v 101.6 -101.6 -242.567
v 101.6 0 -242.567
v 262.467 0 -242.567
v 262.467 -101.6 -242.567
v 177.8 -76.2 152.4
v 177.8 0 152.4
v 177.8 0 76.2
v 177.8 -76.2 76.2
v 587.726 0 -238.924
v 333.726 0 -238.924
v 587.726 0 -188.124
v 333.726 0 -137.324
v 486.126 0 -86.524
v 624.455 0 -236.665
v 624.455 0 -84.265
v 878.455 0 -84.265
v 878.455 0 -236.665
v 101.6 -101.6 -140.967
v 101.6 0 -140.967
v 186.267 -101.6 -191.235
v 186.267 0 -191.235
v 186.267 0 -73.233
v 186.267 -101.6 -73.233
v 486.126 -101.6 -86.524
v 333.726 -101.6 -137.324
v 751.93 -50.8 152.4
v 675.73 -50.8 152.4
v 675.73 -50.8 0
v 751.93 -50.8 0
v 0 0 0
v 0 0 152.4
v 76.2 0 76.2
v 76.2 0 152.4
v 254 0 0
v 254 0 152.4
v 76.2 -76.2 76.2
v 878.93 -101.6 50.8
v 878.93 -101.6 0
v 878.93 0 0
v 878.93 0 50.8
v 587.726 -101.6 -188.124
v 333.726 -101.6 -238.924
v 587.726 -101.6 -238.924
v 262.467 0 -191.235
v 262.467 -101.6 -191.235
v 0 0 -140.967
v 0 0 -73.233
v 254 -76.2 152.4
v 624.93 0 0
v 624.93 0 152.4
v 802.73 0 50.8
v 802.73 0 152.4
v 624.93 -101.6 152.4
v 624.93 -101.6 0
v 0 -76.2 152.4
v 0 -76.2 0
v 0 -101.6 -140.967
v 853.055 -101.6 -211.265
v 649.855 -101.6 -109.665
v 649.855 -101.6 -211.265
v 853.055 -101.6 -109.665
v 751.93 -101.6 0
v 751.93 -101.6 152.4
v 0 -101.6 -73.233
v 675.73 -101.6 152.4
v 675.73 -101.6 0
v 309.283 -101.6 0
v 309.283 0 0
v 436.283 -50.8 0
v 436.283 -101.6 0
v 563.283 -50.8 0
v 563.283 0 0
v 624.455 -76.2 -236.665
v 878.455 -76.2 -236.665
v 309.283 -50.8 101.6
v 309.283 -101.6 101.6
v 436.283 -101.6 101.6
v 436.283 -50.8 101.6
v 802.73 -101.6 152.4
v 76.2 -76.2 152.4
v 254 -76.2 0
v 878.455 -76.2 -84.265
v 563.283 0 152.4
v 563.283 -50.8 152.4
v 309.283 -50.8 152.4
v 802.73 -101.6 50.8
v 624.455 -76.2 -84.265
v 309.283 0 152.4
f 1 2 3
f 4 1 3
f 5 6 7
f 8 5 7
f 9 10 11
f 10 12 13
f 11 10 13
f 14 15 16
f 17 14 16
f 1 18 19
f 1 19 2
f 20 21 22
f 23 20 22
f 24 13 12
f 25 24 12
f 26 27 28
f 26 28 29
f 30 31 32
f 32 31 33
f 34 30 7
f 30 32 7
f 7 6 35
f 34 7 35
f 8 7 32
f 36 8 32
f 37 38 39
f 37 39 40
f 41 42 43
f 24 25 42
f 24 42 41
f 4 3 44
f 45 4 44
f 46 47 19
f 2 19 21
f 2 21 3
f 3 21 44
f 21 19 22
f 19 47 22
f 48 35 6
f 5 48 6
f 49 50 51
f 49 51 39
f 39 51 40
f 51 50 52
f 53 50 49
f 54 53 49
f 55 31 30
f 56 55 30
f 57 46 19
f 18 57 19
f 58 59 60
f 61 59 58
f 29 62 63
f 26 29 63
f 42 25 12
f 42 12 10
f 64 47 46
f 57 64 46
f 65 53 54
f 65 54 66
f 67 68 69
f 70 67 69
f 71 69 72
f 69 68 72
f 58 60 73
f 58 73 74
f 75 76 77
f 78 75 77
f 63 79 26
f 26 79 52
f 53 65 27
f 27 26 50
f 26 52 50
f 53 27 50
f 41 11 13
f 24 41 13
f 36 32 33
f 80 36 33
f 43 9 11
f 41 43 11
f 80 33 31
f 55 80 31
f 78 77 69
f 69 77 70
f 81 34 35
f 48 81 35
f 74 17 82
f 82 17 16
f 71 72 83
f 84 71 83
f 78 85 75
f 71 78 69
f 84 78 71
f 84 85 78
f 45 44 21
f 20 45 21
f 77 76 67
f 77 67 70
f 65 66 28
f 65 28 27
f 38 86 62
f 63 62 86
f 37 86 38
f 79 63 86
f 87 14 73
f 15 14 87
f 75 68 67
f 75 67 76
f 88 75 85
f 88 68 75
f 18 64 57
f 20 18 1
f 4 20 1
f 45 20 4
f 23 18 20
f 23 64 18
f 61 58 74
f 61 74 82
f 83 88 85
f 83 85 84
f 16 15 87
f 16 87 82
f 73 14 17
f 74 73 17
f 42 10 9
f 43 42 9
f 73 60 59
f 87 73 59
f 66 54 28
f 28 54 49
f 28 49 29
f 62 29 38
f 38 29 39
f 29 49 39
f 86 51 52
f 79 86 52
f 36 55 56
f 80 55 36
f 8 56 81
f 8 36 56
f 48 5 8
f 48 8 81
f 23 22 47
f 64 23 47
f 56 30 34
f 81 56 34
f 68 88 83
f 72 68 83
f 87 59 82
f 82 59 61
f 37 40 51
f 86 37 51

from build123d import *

# Parameters (mm, degrees)
F1_DEPTH  = 76.2
F2_W      = 254
F2_H      = 152.4
F3_DEPTH  = 101.6
F5_DEPTH  = 50.8
F6_W      = 76.2
F6_H      = 101.6
F7_DEPTH  = 101.6
F8_W      = 76.2
F8_H      = 152.4
F9_DEPTH  = 50.8
F11_DEPTH = 101.6
F13_DEPTH = 101.6
F14_W     = 254
F14_H     = 152.4
F15_DEPTH = 101.6
F16_SIZE  = 25.4


with BuildPart() as f1:
    # F0 (on Front) → F1 (new body)
    with BuildSketch(Plane.XZ):
        Polygon((0, 152.4), (0, 0), (254, 0), (254, 152.4), (177.8, 152.4), (177.8, 76.2), (76.2, 76.2), (76.2, 152.4), align=None)
    extrude(amount=F1_DEPTH)


with BuildPart() as f3:
    # F2 (on Front) → F3 (new body)
    with BuildSketch(Plane.XZ):
        with Locations((436.282601, 76.2)):
            Rectangle(F2_W, F2_H)
    extrude(amount=F3_DEPTH)

    # F4 (on face) → F5 (cut)
    with BuildSketch(Plane.XZ.offset(101.6)):
        Polygon((309.282601, 152.4), (309.282601, 101.6), (436.282601, 101.6), (436.282601, 0), (563.282601, 0), (563.282601, 152.4), align=None)
    extrude(amount=-F5_DEPTH, mode=Mode.SUBTRACT)


with BuildPart() as f7:
    # F6 (on Front) → F7 (new body)
    with BuildSketch(Plane.XZ):
        Polygon((624.930065, 152.4), (624.930065, 0), (878.930065, 0), (878.930065, 50.8), (802.730065, 50.8), (802.730065, 152.4), (751.930065, 152.4), (751.930065, 50.8), (675.730065, 50.8), (675.730065, 152.4), align=None)
        with Locations((713.830065, 101.6)):
            Rectangle(F6_W, F6_H)
    extrude(amount=F7_DEPTH)

    # F8 (on face) → F9 (cut)
    with BuildSketch(Plane.XZ.offset(101.6)):
        with Locations((713.830065, 76.2)):
            Rectangle(F8_W, F8_H)
    extrude(amount=-F9_DEPTH, mode=Mode.SUBTRACT)


with BuildPart() as f11:
    # F10 (on Front) → F11 (new body)
    with BuildSketch(Plane.XZ):
        Polygon((186.266667, -73.233265), (0, -73.233265), (0, -140.966599), (101.6, -140.966599), (101.6, -242.566599), (262.466667, -242.566599), (262.466667, -191.234748), (186.266667, -191.234748), align=None)
    extrude(amount=F11_DEPTH)


with BuildPart() as f13:
    # F12 (on Front) → F13 (new body)
    with BuildSketch(Plane.XZ):
        Polygon((333.726231, -137.323639), (333.726231, -238.923639), (587.726231, -238.923639), (587.726231, -188.123639), (486.126231, -86.523639), align=None)
    extrude(amount=F13_DEPTH)


with BuildPart() as f15:
    # F14 (on Front) → F15 (new body)
    with BuildSketch(Plane.XZ):
        with Locations((751.454502, -160.465141)):
            Rectangle(F14_W, F14_H)
    extrude(amount=F15_DEPTH)

    # F16
    f16_edges = [f15.edges().sort_by_distance(p)[0] for p in [
        (624.454502, -101.6, -160.465141),
        (751.454502, -101.6, -236.665141),
        (878.454502, -101.6, -160.465141),
        (751.454502, -101.6, -84.265141),
    ]]
    chamfer(f16_edges, length=F16_SIZE)


solid = Compound([f1.part, f3.part, f7.part, f11.part, f13.part, f15.part])
